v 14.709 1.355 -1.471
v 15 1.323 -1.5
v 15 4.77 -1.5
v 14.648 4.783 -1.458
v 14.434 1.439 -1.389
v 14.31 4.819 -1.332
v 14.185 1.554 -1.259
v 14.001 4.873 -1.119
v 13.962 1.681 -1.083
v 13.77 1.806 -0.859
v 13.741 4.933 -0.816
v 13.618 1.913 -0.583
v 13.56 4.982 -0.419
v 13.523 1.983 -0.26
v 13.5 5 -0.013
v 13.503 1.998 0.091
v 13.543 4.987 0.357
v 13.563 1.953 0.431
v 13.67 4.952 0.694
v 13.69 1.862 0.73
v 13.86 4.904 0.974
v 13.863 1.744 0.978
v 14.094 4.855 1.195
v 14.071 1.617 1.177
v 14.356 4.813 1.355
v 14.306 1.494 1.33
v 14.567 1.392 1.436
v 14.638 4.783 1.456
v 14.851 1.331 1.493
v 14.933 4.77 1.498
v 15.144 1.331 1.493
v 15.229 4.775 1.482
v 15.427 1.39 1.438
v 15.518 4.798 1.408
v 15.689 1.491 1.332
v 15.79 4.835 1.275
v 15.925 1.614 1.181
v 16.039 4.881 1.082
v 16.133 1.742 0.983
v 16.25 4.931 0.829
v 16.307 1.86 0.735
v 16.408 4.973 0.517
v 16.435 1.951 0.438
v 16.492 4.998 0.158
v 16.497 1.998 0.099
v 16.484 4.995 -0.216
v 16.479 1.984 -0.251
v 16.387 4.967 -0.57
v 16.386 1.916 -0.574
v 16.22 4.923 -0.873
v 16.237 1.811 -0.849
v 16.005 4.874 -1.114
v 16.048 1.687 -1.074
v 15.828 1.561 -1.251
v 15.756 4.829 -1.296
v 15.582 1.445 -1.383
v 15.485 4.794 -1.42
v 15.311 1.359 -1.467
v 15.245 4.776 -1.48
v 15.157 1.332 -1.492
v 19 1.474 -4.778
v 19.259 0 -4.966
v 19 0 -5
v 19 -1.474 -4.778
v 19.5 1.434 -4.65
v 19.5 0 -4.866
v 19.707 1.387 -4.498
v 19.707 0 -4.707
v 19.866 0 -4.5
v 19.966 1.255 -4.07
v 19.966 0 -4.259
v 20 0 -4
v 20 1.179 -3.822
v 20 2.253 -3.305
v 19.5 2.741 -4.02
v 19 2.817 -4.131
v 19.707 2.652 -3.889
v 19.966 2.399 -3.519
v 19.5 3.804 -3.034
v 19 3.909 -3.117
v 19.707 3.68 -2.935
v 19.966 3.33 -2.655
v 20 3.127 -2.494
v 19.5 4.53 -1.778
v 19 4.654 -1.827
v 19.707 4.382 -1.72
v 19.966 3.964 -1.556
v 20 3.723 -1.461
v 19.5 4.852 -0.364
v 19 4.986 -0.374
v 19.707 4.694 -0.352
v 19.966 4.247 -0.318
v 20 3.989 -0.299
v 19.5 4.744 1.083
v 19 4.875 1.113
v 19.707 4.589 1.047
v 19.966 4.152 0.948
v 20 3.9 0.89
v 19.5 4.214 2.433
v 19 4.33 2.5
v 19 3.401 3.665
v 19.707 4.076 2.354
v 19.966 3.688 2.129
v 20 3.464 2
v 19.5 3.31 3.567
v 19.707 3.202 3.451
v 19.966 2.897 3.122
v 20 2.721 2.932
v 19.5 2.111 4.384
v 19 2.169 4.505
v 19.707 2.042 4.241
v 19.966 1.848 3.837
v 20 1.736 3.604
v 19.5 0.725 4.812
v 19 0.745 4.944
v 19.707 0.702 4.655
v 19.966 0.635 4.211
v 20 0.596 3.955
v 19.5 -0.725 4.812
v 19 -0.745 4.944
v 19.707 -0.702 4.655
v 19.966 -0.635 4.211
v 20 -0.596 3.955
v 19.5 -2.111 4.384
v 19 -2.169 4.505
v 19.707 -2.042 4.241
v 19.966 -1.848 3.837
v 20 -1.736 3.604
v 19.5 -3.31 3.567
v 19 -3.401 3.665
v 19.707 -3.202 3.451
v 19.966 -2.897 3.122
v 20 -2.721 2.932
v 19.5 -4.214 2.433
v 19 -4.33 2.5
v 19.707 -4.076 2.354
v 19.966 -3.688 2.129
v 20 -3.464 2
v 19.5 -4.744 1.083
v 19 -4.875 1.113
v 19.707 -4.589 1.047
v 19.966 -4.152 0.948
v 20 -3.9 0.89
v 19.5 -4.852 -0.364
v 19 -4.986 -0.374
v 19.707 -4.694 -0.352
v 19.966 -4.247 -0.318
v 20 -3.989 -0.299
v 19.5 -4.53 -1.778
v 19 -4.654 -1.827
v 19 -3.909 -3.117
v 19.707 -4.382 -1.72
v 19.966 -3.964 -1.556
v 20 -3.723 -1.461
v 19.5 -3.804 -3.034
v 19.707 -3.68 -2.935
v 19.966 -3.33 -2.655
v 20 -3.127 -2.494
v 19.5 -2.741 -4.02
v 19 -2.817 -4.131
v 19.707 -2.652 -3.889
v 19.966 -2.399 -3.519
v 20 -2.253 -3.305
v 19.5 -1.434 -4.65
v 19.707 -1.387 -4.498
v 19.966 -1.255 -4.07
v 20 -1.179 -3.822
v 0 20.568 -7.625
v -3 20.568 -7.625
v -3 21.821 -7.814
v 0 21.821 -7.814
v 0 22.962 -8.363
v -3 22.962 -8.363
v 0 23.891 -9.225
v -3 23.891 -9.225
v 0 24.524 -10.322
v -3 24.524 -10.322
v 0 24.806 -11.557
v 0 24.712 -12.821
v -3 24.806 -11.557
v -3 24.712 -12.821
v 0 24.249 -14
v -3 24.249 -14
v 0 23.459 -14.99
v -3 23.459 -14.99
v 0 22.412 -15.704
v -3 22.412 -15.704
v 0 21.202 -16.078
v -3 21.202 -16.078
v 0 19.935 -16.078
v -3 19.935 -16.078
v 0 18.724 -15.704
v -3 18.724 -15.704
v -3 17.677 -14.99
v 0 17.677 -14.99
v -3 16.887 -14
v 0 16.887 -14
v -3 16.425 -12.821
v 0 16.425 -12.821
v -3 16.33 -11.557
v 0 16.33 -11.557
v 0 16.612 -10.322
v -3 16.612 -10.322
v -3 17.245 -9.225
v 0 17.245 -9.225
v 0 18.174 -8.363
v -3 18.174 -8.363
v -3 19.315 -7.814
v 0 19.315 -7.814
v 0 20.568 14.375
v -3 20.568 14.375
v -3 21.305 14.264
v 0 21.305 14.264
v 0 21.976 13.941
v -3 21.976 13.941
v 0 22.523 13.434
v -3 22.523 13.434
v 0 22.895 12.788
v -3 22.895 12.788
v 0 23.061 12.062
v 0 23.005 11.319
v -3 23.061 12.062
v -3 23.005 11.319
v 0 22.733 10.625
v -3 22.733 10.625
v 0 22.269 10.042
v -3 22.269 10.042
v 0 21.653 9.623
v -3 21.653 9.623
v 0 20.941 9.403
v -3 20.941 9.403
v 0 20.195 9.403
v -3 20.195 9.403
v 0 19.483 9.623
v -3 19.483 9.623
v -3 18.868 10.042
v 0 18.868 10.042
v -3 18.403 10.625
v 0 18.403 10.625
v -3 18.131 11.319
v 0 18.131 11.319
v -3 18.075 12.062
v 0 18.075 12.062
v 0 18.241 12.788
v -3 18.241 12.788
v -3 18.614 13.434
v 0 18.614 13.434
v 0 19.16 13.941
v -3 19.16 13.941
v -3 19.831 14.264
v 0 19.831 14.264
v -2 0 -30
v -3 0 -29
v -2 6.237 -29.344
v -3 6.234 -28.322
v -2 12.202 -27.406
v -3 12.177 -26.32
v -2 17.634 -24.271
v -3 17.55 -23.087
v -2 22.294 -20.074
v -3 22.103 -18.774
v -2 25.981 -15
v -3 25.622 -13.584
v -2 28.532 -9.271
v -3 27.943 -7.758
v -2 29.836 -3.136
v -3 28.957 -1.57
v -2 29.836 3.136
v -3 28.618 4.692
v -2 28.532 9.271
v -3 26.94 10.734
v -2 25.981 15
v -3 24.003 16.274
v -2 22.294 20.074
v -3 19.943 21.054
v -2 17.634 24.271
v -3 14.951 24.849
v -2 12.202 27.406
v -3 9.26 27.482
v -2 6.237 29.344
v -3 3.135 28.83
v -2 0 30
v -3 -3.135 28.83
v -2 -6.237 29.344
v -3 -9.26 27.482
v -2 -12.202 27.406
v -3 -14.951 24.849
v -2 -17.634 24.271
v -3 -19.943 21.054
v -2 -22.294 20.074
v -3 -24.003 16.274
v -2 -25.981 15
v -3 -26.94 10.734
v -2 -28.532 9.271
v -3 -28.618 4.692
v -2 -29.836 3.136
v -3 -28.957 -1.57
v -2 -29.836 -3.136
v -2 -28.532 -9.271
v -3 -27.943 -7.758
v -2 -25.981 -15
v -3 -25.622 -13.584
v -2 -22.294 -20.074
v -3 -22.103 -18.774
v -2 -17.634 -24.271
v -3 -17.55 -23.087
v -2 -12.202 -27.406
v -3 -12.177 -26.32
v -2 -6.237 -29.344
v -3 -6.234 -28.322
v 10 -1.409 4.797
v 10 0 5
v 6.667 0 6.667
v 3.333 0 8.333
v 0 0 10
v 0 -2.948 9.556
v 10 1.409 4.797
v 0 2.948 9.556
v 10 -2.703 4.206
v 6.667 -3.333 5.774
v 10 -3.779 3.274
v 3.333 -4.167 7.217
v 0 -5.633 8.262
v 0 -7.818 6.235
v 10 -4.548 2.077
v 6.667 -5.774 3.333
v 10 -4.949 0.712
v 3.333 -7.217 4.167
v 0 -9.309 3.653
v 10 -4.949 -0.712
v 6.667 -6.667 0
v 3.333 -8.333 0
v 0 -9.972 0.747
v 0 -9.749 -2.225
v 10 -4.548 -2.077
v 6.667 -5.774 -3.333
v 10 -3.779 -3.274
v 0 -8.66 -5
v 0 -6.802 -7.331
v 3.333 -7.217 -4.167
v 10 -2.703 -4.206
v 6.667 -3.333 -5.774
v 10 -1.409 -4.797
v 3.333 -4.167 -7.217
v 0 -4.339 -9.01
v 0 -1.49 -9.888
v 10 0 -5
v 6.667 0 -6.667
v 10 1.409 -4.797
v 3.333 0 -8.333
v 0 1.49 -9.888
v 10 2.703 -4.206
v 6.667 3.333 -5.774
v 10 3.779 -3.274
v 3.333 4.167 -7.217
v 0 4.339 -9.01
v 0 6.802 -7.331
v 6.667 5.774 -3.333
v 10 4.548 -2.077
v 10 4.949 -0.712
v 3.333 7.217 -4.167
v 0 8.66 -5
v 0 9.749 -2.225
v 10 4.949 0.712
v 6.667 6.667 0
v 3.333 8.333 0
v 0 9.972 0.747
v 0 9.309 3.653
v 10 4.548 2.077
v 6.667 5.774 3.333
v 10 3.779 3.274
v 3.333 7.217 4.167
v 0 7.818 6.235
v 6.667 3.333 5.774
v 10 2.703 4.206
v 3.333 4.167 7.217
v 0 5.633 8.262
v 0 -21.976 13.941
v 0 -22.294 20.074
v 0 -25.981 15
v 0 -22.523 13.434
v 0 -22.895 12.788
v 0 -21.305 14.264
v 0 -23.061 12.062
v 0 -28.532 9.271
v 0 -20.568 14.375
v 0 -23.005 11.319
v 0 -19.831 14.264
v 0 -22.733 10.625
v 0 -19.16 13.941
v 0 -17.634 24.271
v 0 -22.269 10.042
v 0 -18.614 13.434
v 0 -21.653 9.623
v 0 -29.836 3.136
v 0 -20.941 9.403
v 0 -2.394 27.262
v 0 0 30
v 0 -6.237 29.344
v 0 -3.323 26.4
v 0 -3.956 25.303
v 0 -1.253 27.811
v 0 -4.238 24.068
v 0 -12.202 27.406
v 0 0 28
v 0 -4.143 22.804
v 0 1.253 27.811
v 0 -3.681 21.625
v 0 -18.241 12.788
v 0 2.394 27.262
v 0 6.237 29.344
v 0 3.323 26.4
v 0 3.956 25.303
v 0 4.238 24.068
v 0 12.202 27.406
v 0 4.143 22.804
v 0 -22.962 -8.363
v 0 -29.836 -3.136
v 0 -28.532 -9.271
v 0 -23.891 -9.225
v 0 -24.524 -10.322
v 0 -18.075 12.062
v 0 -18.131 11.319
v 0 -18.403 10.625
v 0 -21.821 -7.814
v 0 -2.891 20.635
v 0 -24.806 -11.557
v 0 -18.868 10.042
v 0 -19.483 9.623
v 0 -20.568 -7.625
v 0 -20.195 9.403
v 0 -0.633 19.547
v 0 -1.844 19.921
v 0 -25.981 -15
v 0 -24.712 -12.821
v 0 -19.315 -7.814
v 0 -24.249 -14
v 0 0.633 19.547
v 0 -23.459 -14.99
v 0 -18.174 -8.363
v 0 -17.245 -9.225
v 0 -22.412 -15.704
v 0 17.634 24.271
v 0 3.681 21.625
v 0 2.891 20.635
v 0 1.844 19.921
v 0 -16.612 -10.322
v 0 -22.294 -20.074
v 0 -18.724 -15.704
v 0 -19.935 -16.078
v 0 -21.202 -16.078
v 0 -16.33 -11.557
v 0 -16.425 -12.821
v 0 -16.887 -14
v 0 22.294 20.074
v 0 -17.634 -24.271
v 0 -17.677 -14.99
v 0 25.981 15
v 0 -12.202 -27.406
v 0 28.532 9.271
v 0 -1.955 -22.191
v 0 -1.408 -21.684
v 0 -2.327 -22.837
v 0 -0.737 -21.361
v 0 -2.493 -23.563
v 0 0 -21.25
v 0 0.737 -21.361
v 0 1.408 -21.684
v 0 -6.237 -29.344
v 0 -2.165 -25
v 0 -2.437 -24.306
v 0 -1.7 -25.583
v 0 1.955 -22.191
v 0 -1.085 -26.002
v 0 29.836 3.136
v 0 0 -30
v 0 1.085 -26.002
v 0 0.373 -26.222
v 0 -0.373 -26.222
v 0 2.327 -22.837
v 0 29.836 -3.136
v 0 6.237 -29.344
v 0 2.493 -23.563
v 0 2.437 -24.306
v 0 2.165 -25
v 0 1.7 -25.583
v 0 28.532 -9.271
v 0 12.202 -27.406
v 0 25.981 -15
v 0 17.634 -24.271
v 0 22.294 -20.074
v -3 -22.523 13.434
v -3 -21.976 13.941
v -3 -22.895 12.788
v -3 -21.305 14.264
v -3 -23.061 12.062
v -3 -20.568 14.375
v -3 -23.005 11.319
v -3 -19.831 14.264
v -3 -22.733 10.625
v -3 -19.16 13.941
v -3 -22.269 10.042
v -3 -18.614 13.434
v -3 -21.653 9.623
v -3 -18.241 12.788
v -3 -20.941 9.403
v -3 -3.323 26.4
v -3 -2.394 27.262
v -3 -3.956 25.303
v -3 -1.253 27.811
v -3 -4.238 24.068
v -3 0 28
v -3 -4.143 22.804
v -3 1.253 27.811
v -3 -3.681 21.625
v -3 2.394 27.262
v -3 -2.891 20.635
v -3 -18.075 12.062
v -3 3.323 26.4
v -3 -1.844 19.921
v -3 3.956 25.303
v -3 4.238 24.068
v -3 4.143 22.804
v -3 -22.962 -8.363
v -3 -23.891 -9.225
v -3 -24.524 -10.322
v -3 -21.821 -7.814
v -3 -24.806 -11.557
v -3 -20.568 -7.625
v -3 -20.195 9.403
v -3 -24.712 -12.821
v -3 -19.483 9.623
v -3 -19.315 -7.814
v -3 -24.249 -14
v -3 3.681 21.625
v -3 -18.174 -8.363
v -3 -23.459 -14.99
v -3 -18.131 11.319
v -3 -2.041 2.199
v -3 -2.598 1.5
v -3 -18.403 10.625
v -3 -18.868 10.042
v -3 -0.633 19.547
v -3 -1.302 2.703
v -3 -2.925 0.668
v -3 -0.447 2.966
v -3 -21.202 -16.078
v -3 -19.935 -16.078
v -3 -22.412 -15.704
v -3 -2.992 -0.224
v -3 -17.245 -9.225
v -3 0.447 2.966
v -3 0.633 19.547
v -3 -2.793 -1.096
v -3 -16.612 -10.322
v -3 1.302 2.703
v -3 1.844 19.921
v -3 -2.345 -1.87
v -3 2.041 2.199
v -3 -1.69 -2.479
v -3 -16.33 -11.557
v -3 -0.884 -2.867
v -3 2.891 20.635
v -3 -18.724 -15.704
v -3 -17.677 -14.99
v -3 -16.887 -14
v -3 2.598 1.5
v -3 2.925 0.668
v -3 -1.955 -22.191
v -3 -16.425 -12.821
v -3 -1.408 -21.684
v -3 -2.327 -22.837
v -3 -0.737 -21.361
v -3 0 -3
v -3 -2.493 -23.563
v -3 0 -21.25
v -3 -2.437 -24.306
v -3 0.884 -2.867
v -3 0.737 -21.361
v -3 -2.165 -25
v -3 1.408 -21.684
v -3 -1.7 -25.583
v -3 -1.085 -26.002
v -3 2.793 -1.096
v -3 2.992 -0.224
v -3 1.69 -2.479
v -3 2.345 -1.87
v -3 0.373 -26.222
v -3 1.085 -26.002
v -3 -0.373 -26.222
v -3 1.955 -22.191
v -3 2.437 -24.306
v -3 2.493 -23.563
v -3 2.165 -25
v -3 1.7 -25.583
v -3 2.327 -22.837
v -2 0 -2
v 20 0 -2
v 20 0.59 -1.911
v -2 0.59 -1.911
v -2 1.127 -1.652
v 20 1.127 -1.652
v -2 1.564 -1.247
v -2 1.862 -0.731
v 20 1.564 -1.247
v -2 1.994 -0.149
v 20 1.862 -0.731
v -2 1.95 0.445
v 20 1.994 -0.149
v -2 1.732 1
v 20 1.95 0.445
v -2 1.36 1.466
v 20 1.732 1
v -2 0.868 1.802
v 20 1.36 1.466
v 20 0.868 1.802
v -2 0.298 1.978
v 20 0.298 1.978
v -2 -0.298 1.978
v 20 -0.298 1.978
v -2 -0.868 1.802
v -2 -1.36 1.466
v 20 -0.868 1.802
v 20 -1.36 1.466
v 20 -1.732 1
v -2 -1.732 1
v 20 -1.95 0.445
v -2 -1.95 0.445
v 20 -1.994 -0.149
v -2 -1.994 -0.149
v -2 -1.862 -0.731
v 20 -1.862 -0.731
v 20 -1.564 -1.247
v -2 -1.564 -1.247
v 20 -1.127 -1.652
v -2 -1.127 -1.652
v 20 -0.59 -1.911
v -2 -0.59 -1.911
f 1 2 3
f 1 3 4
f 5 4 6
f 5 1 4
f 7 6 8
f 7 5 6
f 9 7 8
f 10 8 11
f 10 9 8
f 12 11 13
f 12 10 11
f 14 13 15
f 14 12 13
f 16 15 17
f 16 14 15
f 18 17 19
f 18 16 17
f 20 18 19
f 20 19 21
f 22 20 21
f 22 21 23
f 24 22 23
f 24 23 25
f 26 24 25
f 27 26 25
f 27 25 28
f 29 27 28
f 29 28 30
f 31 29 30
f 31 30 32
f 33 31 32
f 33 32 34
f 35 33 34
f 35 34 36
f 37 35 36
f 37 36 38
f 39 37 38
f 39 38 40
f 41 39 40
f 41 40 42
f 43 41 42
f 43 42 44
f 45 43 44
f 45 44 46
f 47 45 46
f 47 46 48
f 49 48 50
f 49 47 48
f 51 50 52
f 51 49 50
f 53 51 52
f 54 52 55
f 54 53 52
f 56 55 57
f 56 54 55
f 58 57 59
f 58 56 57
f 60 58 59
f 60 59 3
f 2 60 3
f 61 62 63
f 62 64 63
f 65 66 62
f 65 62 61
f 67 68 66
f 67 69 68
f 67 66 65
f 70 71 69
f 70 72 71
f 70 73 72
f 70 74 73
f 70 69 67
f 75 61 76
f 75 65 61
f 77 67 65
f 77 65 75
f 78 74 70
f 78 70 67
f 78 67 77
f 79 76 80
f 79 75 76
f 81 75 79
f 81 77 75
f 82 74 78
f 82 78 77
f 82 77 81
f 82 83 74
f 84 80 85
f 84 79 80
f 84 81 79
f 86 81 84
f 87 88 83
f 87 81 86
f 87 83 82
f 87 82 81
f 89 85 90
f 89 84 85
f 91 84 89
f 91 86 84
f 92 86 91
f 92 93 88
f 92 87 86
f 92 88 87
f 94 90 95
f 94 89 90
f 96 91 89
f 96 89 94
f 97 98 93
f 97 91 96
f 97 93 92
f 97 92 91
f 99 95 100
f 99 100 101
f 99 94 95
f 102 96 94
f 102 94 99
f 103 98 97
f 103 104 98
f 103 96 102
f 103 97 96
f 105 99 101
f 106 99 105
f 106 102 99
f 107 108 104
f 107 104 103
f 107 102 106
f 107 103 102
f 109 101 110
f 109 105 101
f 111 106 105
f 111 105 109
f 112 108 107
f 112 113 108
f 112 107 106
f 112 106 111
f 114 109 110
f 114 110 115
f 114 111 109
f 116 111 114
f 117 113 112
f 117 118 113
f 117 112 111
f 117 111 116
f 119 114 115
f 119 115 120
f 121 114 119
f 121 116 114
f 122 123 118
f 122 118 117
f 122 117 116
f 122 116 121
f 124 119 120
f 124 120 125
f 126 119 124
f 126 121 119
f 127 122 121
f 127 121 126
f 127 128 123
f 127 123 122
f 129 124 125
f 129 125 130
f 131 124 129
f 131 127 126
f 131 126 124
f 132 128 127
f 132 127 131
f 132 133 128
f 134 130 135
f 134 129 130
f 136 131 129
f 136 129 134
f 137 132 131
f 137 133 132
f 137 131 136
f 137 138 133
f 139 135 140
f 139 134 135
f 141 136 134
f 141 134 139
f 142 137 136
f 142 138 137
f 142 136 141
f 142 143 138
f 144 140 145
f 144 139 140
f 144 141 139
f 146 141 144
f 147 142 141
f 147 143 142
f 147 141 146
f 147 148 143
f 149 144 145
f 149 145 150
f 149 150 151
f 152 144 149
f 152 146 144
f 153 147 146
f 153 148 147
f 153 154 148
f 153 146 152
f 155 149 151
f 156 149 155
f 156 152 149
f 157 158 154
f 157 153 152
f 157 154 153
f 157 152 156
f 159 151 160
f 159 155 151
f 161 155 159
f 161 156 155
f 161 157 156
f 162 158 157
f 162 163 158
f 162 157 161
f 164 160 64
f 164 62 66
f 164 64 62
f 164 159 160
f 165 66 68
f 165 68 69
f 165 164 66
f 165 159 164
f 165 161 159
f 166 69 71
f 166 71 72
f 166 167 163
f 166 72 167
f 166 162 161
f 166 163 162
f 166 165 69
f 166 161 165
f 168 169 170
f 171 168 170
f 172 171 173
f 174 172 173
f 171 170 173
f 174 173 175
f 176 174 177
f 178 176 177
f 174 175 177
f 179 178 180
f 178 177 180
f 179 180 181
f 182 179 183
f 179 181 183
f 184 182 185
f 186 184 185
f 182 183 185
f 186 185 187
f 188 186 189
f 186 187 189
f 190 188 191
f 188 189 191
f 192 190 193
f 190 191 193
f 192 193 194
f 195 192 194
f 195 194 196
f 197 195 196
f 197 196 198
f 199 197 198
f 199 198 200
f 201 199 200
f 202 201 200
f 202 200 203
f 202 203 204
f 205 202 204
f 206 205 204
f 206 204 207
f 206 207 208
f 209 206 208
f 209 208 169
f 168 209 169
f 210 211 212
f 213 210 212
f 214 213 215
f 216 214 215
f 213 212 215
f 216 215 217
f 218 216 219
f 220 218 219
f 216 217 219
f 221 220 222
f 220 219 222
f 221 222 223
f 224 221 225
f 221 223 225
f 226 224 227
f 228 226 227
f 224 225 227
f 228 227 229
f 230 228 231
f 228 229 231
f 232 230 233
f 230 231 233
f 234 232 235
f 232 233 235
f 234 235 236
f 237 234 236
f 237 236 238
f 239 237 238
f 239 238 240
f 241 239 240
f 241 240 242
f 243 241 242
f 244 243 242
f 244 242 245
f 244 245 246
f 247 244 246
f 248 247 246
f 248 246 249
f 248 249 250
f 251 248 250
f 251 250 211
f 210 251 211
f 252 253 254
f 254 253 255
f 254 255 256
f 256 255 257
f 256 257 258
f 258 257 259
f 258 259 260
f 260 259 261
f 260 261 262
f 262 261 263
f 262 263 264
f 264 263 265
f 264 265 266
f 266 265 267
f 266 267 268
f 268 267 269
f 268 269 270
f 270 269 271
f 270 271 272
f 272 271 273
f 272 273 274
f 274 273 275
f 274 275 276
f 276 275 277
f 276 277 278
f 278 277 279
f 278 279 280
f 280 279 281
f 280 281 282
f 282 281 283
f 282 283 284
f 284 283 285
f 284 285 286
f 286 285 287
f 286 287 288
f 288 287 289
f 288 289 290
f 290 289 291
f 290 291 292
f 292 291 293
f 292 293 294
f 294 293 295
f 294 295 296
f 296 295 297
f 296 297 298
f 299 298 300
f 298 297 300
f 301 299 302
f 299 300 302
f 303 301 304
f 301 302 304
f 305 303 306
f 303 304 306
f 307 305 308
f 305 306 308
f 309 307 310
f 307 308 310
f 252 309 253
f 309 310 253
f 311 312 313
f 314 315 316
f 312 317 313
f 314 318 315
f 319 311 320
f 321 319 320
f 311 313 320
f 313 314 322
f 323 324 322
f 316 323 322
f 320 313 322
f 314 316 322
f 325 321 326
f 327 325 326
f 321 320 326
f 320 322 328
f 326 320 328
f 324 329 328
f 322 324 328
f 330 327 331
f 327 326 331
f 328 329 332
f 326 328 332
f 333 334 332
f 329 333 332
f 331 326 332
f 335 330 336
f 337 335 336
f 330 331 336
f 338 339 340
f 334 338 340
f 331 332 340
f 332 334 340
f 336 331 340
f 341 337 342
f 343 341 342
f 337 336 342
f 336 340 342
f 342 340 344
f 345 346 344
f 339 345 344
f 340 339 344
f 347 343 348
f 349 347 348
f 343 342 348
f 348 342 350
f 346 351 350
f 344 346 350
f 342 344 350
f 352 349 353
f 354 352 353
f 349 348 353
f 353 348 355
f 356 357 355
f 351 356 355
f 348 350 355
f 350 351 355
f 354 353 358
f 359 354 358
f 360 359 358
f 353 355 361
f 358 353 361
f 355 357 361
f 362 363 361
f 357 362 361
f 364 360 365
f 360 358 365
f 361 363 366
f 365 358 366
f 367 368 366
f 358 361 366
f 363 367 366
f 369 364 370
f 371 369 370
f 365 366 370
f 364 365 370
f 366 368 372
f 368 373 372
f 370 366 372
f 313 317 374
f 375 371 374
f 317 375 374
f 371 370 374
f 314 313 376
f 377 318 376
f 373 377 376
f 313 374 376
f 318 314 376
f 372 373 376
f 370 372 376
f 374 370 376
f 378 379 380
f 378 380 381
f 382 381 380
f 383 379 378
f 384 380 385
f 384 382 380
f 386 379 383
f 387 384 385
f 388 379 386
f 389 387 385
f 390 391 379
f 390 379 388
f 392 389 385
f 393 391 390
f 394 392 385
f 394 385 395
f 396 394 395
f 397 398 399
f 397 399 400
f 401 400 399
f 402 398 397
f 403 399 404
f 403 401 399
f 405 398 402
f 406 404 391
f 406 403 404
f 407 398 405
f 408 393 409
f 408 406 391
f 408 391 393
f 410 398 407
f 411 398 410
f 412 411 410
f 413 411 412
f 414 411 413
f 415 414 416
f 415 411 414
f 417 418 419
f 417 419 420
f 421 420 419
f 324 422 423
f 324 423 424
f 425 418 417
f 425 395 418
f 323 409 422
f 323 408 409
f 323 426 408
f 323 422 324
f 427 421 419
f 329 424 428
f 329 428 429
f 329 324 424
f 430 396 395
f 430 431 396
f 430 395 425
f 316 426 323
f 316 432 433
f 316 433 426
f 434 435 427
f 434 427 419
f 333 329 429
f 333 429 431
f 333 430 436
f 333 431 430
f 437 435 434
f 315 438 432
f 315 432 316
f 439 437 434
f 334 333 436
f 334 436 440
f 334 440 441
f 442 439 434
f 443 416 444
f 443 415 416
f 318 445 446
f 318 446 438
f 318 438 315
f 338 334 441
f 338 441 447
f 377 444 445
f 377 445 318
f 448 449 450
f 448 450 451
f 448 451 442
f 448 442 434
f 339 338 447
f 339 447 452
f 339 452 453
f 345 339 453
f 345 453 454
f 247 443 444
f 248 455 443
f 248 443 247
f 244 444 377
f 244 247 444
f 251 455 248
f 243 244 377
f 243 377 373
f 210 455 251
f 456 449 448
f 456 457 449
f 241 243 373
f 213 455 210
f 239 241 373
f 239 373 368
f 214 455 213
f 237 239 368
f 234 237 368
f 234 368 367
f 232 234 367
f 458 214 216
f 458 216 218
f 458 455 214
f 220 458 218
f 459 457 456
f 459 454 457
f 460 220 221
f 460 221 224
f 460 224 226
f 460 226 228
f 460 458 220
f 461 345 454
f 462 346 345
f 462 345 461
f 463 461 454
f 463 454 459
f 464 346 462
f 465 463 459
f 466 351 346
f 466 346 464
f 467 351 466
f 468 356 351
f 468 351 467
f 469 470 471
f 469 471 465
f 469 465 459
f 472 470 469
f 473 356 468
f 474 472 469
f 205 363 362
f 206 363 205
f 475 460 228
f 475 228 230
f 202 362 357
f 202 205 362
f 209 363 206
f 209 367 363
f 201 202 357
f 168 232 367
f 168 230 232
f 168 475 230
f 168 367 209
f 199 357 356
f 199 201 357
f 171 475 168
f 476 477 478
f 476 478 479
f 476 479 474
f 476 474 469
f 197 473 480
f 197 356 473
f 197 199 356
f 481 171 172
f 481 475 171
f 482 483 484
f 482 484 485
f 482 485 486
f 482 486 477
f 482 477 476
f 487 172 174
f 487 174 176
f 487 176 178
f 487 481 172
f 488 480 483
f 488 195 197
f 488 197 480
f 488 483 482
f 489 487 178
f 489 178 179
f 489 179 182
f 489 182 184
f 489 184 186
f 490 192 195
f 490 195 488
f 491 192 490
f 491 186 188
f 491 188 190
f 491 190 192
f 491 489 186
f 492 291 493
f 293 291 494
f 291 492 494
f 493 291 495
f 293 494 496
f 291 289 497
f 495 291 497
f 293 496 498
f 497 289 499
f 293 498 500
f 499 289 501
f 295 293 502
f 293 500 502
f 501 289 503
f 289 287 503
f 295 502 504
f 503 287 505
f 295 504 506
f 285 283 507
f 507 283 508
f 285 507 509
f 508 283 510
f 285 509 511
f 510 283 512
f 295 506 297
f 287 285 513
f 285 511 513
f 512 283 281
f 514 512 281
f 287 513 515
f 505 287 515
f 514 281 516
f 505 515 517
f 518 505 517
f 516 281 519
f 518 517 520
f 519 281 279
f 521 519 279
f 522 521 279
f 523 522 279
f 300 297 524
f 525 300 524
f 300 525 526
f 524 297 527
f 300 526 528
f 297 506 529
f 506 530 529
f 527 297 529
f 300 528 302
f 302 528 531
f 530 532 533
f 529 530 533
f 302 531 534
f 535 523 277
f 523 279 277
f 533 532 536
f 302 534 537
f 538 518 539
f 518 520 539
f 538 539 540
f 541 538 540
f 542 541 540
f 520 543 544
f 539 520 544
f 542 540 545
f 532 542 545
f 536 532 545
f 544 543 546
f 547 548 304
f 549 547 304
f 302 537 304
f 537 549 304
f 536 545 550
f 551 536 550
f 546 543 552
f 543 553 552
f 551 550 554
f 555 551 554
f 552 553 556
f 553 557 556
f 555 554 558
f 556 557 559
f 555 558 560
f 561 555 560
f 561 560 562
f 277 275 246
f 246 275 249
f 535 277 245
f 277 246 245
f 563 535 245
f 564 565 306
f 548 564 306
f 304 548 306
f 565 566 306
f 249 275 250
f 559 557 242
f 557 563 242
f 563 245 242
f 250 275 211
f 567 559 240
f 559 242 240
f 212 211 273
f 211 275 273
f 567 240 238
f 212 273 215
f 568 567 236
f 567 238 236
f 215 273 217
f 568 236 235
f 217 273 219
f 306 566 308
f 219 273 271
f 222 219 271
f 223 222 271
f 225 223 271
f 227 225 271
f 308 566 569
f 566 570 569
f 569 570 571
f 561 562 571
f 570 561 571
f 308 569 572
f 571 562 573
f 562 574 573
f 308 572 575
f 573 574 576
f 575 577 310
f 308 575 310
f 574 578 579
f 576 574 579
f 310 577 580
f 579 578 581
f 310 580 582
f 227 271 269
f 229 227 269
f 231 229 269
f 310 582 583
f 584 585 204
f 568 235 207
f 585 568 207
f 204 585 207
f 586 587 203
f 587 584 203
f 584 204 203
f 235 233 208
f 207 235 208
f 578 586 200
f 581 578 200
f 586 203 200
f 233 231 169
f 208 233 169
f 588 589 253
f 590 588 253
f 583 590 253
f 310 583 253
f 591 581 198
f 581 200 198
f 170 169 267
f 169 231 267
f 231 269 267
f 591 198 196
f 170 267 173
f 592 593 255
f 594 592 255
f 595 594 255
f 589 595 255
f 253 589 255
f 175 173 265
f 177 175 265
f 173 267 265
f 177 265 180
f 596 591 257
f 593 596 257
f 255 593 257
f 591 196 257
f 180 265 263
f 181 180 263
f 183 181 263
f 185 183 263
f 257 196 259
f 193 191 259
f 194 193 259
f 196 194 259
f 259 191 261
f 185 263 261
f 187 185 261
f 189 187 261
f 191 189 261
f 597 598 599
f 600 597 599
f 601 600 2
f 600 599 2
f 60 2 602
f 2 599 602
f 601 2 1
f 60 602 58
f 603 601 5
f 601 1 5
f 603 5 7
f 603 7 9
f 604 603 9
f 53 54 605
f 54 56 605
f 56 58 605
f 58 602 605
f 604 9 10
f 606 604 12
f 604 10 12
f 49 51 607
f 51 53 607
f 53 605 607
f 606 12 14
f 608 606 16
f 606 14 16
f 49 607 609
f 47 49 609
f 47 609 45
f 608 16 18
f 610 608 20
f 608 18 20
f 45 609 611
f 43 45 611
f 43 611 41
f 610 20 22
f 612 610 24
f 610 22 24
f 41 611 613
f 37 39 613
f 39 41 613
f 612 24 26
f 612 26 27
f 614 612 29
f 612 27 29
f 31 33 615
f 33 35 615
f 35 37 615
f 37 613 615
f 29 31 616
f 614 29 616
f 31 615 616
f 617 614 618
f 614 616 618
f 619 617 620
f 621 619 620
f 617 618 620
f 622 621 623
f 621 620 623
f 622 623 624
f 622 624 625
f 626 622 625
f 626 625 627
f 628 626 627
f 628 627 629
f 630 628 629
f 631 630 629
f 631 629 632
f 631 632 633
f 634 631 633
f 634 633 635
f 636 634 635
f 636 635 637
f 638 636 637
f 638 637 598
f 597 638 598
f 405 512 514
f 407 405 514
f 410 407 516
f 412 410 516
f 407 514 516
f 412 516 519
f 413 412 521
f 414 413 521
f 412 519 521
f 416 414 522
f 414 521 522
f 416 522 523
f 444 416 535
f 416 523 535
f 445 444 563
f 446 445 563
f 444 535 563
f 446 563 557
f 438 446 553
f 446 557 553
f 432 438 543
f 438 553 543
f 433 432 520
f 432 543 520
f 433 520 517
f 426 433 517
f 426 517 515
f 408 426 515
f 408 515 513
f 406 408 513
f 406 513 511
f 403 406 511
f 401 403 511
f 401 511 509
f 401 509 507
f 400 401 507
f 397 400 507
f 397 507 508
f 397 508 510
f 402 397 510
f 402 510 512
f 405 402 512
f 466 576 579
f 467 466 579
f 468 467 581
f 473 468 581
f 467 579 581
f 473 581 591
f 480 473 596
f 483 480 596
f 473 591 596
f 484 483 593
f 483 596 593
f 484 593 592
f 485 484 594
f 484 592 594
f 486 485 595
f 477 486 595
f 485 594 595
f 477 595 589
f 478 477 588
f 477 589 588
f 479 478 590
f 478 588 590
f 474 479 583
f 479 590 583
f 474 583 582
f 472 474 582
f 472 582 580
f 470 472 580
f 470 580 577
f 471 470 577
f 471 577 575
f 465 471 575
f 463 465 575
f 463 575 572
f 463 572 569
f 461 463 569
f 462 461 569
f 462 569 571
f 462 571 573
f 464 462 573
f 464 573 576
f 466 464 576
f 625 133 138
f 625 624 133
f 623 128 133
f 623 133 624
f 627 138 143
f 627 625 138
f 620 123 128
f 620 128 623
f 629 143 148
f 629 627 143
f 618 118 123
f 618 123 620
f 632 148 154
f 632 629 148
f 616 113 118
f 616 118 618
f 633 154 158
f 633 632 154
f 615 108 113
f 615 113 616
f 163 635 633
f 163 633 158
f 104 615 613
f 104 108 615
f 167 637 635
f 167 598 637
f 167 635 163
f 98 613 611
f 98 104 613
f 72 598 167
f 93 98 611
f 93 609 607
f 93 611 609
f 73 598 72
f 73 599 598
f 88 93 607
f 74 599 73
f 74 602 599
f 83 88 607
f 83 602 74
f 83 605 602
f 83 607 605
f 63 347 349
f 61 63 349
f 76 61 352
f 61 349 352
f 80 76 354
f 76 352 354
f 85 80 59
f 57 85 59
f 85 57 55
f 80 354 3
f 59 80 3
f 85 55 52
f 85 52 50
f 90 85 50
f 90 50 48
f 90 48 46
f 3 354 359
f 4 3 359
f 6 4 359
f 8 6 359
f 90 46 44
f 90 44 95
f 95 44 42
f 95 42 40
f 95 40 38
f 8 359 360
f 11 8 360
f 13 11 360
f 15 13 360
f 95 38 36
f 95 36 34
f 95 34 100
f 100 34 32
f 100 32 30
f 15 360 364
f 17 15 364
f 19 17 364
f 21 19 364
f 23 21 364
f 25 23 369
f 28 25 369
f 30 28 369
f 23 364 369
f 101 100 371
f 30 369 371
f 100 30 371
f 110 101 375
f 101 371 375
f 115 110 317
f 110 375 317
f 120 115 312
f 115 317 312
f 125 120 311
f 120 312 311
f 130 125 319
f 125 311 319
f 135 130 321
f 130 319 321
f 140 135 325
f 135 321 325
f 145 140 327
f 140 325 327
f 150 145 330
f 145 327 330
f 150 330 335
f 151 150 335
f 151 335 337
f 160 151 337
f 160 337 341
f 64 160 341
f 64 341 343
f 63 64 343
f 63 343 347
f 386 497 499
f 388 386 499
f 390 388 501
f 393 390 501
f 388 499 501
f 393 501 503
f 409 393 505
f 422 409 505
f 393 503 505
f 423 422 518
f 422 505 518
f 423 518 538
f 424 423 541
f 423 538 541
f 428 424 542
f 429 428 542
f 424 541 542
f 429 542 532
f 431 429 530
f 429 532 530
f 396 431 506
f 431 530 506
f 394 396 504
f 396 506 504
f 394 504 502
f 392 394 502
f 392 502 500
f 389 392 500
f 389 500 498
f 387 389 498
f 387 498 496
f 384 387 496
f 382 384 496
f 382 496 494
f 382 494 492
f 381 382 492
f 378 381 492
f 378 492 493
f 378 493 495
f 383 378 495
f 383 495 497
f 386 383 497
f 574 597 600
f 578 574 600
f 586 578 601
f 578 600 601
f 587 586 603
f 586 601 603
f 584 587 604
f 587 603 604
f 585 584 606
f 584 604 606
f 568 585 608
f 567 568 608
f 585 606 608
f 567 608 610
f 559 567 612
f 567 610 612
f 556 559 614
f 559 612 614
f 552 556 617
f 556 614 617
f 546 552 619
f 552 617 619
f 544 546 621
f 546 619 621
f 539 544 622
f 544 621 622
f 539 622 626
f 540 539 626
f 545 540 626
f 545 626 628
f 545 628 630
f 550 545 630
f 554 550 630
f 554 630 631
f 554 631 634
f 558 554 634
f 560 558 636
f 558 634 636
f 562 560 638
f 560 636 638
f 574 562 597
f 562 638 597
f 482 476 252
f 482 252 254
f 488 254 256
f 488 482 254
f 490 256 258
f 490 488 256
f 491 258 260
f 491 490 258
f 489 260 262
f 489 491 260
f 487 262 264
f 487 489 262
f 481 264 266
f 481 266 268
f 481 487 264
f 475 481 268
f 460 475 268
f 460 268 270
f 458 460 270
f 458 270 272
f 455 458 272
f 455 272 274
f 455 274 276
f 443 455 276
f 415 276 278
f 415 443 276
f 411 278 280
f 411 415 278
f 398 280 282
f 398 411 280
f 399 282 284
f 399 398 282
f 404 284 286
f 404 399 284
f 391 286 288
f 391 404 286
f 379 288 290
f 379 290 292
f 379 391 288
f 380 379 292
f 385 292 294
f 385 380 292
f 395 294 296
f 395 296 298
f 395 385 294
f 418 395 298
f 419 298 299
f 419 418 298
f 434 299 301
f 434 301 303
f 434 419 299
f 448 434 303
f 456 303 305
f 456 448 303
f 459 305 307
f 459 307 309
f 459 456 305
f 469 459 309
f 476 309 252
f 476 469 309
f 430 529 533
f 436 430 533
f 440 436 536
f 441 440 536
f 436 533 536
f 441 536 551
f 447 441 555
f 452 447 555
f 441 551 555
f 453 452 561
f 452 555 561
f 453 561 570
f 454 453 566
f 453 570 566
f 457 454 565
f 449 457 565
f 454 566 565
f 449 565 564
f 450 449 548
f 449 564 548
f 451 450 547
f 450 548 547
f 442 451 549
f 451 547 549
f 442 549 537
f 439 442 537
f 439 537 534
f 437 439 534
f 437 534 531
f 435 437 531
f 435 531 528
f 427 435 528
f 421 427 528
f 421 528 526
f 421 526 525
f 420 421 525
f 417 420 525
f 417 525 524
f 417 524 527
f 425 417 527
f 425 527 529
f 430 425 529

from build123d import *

# Parameters (mm, degrees)
SKETCH1_R           = 30
BOSS_EXTRUDE1_DEPTH = 3
SKETCH2_R           = 10
BOSS_EXTRUDE2_DEPTH = 10
SKETCH3_R           = 5
BOSS_EXTRUDE3_DEPTH = 10
SKETCH6_R           = 2
CUT_EXTRUDE1_DEPTH  = 49.259714048
CUT_EXTRUDE2_REACH  = 50.26
SKETCH7_R           = 4.25
SKETCH7_R_2         = 2.5
SKETCH8_R           = 1.5
CUT_EXTRUDE3_DEPTH  = 15
FILLET1_R           = 1
CHAMFER1_SIZE       = 1
CHAMFER2_SIZE       = 1


with BuildPart() as part:
    # Sketch1 → Boss-Extrude1 (new body)
    with BuildSketch(Plane(origin=(0, 0, 0), x_dir=(0, 0, -1), z_dir=(1, 0, 0))):
        Circle(SKETCH1_R)
    extrude(amount=-BOSS_EXTRUDE1_DEPTH)

    # Sketch2 → Boss-Extrude2 (add)
    with BuildSketch(Plane(origin=(0, 0, 0), x_dir=(0, 0, -1), z_dir=(1, 0, 0))):
        Circle(SKETCH2_R)
    extrude(amount=BOSS_EXTRUDE2_DEPTH)

    # Sketch3 → Boss-Extrude3 (add)
    with BuildSketch(Plane(origin=(10, 0, 0), x_dir=(0, 0, -1), z_dir=(1, 0, 0))):
        Circle(SKETCH3_R)
    extrude(amount=BOSS_EXTRUDE3_DEPTH)

    # Sketch4 → Cut-Revolve1 (revolve, cut)
    with BuildSketch(Plane.XY, mode=Mode.PRIVATE) as cut_revolve1_sk:
        Polygon((10, 5), (0, 10), (10, 10), align=None)
    revolve(cut_revolve1_sk.sketch.rotate(Axis((0, 0, 0), (1, 0, 0)), 90), axis=Axis((0, 0, 0), (1, 0, 0)), mode=Mode.SUBTRACT)

    # Sketch6 → Cut-Extrude1 (cut, through all)
    with BuildSketch(Plane(origin=(20, 0, 0), x_dir=(0, 0, -1), z_dir=(1, 0, 0))):
        Circle(SKETCH6_R)
    extrude(amount=-CUT_EXTRUDE1_DEPTH, mode=Mode.SUBTRACT)

    # Sketch7 → Cut-Extrude2 (cut, up to next)
    with BuildSketch(Plane.ZY.offset(3), mode=Mode.PRIVATE) as cut_extrude2_sk1:
        with Locations((-11.875, 20.56810334)):
            Circle(SKETCH7_R)
    cut_extrude2_tool1 = extrude(cut_extrude2_sk1.sketch, amount=-CUT_EXTRUDE2_REACH, mode=Mode.PRIVATE) & part.part
    # Sketch7 → Cut-Extrude2 (cut, up to next)
    with BuildSketch(Plane.ZY.offset(3), mode=Mode.PRIVATE) as cut_extrude2_sk2:
        with Locations((23.75, 0)):
            Circle(SKETCH7_R)
    cut_extrude2_tool2 = extrude(cut_extrude2_sk2.sketch, amount=-CUT_EXTRUDE2_REACH, mode=Mode.PRIVATE) & part.part
    # Sketch7 → Cut-Extrude2 (cut, up to next)
    with BuildSketch(Plane.ZY.offset(3), mode=Mode.PRIVATE) as cut_extrude2_sk3:
        with Locations((-11.875, -20.56810334)):
            Circle(SKETCH7_R)
    cut_extrude2_tool3 = extrude(cut_extrude2_sk3.sketch, amount=-CUT_EXTRUDE2_REACH, mode=Mode.PRIVATE) & part.part
    # Sketch7 → Cut-Extrude2 (cut, up to next)
    with BuildSketch(Plane.ZY.offset(3), mode=Mode.PRIVATE) as cut_extrude2_sk4:
        with Locations((11.875, 20.56810334)):
            Circle(SKETCH7_R_2)
    cut_extrude2_tool4 = extrude(cut_extrude2_sk4.sketch, amount=-CUT_EXTRUDE2_REACH, mode=Mode.PRIVATE) & part.part
    # Sketch7 → Cut-Extrude2 (cut, up to next)
    with BuildSketch(Plane.ZY.offset(3), mode=Mode.PRIVATE) as cut_extrude2_sk5:
        with Locations((11.875, -20.56810334)):
            Circle(SKETCH7_R_2)
    cut_extrude2_tool5 = extrude(cut_extrude2_sk5.sketch, amount=-CUT_EXTRUDE2_REACH, mode=Mode.PRIVATE) & part.part
    # Sketch7 → Cut-Extrude2 (cut, up to next)
    with BuildSketch(Plane.ZY.offset(3), mode=Mode.PRIVATE) as cut_extrude2_sk6:
        with Locations((-23.75, 0)):
            Circle(SKETCH7_R_2)
    cut_extrude2_tool6 = extrude(cut_extrude2_sk6.sketch, amount=-CUT_EXTRUDE2_REACH, mode=Mode.PRIVATE) & part.part
    add(cut_extrude2_tool1.solids().sort_by_distance((-3, 20.568103, -11.875))[0], mode=Mode.SUBTRACT)
    add(cut_extrude2_tool2.solids().sort_by_distance((-3, 0, 23.75))[0], mode=Mode.SUBTRACT)
    add(cut_extrude2_tool3.solids().sort_by_distance((-3, -20.568103, -11.875))[0], mode=Mode.SUBTRACT)
    add(cut_extrude2_tool4.solids().sort_by_distance((-3, 20.568103, 11.875))[0], mode=Mode.SUBTRACT)
    add(cut_extrude2_tool5.solids().sort_by_distance((-3, -20.568103, 11.875))[0], mode=Mode.SUBTRACT)
    add(cut_extrude2_tool6.solids().sort_by_distance((-3, 0, -23.75))[0], mode=Mode.SUBTRACT)

    # Sketch8 → Cut-Extrude3 (cut)
    with BuildSketch(Plane(origin=(0, 0, 0), x_dir=(1, 0, 0), z_dir=(0, 1, 0))):
        with Locations(Location((15, 0, 0), (0, 0, 90))):
            Circle(SKETCH8_R)
    extrude(amount=CUT_EXTRUDE3_DEPTH, mode=Mode.SUBTRACT)

    # Fillet1
    fillet1_edges = [part.edges().sort_by_distance(p)[0] for p in [
        (20, 0, 5),
    ]]
    fillet(fillet1_edges, radius=FILLET1_R)

    # Chamfer1
    chamfer1_edges = [part.edges().sort_by_distance(p)[0] for p in [
        (-3, 0, 30),
    ]]
    chamfer(chamfer1_edges, length=CHAMFER1_SIZE)

    # Chamfer2
    chamfer2_edges = [part.edges().sort_by_distance(p)[0] for p in [
        (-3, 0, 2),
    ]]
    chamfer(chamfer2_edges, length=CHAMFER2_SIZE)


solid = part.part
